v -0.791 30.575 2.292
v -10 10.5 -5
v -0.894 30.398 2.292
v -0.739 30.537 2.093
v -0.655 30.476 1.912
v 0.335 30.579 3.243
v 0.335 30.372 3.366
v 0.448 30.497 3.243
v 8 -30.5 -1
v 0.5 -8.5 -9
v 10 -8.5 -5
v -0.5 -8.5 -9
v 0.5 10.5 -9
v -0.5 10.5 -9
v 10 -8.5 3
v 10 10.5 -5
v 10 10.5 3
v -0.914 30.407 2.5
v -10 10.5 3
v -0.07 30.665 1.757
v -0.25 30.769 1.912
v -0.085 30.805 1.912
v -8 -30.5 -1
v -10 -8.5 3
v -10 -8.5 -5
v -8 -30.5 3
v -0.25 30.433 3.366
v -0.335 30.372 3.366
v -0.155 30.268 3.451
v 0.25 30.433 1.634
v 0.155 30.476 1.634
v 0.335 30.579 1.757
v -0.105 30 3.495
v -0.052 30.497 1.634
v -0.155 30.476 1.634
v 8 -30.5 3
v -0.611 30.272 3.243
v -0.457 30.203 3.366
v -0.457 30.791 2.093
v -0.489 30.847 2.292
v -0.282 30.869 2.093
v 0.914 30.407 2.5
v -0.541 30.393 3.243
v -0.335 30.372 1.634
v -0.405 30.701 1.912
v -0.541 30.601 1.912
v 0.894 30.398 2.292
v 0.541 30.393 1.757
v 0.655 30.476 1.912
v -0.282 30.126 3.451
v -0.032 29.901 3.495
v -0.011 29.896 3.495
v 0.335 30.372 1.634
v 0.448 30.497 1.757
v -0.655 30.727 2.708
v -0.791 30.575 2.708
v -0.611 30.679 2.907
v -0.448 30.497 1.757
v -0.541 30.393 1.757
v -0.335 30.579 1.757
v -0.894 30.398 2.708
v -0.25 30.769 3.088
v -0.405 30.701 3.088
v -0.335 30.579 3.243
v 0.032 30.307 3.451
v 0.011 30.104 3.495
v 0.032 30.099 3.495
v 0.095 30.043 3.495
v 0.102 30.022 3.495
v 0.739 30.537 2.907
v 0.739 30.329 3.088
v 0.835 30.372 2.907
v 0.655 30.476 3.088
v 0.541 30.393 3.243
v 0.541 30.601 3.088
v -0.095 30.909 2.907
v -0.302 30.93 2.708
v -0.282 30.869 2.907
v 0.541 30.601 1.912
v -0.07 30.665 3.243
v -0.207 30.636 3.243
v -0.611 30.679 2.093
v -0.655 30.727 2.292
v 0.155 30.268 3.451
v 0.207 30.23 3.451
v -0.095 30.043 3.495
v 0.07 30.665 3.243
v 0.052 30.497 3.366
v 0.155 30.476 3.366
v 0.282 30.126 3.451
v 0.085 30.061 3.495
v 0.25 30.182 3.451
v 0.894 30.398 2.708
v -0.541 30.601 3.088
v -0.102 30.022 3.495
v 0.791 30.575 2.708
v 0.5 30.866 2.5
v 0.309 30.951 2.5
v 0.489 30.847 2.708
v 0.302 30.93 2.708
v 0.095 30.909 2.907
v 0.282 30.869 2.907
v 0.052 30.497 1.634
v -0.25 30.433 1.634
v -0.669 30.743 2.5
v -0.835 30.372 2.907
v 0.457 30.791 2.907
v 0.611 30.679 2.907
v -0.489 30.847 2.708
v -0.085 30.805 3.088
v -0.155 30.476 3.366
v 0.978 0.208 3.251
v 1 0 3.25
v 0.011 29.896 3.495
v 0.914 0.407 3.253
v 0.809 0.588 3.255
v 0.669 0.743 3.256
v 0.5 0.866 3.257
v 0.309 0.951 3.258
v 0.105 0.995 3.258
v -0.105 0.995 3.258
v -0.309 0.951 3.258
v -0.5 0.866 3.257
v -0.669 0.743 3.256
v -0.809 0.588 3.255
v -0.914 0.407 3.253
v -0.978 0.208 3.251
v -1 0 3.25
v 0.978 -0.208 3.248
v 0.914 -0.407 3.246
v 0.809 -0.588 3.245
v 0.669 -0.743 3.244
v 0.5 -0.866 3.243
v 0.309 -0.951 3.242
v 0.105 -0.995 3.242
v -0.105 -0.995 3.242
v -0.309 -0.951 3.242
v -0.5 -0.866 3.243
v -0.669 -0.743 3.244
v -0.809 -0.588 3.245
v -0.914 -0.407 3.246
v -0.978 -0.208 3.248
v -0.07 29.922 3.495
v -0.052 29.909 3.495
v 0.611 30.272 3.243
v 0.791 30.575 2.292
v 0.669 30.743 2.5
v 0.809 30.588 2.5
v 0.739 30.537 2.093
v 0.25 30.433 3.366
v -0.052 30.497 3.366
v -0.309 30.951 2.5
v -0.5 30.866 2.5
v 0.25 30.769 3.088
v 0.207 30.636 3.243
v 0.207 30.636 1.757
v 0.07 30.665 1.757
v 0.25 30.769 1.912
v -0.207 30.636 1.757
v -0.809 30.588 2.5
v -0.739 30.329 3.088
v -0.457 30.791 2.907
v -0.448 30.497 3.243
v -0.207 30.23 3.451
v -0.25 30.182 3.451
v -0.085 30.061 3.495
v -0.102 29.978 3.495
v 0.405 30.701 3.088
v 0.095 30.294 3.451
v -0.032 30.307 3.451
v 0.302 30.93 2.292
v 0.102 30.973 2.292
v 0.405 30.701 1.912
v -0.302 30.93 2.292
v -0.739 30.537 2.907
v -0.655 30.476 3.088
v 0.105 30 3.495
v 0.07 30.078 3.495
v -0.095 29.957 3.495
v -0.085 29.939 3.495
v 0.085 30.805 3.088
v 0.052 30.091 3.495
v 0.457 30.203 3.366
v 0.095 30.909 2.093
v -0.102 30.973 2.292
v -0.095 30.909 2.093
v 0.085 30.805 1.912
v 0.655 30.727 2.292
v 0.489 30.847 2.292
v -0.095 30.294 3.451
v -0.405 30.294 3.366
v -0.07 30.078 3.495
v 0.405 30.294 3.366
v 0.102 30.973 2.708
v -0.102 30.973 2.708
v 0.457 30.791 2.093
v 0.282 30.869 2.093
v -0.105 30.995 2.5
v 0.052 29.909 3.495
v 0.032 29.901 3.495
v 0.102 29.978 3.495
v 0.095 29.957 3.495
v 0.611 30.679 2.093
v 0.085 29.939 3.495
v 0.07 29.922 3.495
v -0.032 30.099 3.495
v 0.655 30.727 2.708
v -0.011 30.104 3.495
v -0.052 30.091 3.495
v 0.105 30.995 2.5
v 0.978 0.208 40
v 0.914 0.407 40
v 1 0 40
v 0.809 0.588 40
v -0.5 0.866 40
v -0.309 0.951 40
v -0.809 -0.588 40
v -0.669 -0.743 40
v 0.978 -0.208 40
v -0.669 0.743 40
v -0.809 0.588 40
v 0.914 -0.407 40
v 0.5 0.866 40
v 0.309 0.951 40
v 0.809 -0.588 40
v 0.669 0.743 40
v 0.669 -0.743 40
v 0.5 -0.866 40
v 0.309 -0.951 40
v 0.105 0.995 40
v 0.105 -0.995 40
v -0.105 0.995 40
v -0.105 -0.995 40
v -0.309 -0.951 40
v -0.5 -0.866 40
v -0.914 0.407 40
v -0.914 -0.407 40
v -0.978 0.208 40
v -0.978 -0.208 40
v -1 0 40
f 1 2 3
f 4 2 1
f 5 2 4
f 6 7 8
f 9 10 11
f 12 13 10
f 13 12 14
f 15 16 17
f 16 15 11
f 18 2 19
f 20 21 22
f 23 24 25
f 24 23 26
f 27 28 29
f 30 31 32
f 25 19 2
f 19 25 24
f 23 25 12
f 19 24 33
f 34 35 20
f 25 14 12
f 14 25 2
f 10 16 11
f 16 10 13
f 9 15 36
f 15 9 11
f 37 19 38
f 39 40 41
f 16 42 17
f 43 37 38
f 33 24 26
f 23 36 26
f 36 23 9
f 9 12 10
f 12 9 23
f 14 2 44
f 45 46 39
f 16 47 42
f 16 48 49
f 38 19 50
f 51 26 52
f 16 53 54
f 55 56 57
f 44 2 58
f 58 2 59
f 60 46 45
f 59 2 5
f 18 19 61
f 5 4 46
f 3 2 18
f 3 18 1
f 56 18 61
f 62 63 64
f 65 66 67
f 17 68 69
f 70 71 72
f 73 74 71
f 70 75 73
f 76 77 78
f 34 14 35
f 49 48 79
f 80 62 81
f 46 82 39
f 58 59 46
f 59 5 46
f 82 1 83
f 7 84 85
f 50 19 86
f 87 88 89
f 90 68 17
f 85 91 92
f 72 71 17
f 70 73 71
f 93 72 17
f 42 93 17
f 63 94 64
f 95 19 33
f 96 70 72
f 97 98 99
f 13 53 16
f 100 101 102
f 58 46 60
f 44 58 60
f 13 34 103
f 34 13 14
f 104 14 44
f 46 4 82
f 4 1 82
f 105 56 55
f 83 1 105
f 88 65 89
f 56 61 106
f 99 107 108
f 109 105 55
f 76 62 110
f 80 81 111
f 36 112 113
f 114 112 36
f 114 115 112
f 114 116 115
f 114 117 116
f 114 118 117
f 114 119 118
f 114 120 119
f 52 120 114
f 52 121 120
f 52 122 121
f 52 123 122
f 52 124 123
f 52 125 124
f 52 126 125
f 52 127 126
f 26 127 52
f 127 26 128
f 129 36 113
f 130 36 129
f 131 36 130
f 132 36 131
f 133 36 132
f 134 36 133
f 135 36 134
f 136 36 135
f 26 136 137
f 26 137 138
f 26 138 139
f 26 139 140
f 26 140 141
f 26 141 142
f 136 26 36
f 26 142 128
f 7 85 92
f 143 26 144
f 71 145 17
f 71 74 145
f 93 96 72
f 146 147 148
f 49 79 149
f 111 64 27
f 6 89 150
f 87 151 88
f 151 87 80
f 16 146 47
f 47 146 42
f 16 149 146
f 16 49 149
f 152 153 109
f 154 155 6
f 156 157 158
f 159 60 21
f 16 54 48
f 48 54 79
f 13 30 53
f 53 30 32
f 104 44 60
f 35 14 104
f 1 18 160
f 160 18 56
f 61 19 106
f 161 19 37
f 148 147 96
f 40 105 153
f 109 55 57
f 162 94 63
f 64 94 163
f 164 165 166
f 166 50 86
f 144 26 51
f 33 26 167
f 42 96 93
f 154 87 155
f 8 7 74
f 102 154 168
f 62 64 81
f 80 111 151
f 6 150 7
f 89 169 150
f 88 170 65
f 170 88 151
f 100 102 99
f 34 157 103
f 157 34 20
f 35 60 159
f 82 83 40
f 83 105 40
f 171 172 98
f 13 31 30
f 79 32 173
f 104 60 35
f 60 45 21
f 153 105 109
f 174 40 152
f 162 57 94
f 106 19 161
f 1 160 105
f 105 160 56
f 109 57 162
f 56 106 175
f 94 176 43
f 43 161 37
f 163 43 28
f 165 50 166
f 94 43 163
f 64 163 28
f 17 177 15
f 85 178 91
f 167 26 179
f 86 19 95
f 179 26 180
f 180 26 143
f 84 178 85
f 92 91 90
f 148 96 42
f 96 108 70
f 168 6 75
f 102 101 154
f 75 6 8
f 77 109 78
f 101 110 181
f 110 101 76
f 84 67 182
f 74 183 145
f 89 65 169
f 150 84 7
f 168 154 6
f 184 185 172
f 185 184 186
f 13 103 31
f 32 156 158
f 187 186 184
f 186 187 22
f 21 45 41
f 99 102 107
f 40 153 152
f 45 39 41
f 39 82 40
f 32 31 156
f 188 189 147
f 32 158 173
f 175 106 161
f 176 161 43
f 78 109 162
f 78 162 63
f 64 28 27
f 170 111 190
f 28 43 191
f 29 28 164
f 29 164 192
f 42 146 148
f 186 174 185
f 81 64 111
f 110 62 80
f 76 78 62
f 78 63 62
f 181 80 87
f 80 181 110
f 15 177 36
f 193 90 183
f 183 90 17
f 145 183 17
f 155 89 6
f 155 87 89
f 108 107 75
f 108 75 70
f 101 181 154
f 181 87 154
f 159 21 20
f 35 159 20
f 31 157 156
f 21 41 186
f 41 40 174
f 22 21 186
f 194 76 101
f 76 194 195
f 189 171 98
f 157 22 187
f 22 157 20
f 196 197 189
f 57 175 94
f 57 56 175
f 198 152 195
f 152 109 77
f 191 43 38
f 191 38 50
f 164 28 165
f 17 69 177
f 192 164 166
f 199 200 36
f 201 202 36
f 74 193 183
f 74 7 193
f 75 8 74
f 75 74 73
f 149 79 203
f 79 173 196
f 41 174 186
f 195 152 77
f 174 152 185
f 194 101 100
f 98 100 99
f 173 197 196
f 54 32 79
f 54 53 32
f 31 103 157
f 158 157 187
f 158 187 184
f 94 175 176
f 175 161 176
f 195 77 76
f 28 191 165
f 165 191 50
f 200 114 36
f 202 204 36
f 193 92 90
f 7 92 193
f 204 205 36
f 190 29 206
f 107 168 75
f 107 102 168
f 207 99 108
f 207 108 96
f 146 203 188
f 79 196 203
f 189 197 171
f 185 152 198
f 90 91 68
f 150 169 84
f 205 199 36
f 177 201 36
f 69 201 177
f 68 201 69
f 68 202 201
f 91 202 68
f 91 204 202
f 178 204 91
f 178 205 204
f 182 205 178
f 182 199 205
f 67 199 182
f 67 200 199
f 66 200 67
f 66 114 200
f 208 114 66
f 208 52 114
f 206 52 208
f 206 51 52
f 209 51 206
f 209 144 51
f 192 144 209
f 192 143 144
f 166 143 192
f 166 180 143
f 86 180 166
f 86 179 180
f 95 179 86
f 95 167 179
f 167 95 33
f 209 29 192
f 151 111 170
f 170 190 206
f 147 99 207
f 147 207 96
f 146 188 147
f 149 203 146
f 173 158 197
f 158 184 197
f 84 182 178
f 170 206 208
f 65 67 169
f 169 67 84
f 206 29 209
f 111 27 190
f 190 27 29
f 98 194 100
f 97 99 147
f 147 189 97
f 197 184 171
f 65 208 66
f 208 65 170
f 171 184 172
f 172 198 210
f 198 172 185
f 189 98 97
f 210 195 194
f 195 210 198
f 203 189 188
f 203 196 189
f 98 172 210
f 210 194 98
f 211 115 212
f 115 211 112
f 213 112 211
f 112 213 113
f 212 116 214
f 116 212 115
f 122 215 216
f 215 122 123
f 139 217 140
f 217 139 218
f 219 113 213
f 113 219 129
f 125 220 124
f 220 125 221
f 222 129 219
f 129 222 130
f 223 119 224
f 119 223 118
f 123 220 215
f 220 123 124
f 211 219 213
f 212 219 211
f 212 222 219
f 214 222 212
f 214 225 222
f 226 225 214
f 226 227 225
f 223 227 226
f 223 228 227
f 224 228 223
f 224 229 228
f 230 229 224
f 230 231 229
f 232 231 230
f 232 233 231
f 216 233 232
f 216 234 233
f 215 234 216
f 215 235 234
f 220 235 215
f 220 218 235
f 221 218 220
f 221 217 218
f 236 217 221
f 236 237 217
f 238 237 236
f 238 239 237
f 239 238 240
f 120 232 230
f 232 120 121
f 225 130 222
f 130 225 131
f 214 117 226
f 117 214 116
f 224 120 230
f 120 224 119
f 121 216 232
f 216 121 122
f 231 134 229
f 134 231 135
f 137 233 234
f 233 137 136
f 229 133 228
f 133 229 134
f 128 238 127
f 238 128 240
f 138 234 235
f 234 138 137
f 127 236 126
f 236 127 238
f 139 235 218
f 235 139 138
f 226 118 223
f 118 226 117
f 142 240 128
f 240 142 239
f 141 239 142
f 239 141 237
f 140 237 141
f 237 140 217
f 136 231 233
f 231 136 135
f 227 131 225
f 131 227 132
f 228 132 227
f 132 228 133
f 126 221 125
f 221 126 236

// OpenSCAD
// Hull Example
// The hull of a toy sailboat
$fs = .1;
hull(){
    translate([0,30,2.5]) sphere(1); //bow
    translate([0,10,-1]) cube([20,1,8],true); //1st bulkhead
    translate([0,10,-5]) cube([1,1,8],true); //1st keel
    translate([0,-8,-1]) cube([20,1,8],true); //2nd bulkhead
    translate([0,-8,-5]) cube([1,1,8],true); //2nd keel
    translate([0,-30,1]) cube([16,1,4],true); //stern
}
    cylinder(40,1,1); //Mast


// written by Paul Young, 2022
//  paulwhy.2@gmail.com

// To the extent possible under law, the author(s) have dedicated all
// copyright and related and neighboring rights to this software to the
// public domain worldwide. This software is distributed without any
// warranty.
//
// You should have received a copy of the CC0 Public Domain
// Dedication along with this software.
// If not, see <http://creativecommons.org/publicdomain/zero/1.0/>.
